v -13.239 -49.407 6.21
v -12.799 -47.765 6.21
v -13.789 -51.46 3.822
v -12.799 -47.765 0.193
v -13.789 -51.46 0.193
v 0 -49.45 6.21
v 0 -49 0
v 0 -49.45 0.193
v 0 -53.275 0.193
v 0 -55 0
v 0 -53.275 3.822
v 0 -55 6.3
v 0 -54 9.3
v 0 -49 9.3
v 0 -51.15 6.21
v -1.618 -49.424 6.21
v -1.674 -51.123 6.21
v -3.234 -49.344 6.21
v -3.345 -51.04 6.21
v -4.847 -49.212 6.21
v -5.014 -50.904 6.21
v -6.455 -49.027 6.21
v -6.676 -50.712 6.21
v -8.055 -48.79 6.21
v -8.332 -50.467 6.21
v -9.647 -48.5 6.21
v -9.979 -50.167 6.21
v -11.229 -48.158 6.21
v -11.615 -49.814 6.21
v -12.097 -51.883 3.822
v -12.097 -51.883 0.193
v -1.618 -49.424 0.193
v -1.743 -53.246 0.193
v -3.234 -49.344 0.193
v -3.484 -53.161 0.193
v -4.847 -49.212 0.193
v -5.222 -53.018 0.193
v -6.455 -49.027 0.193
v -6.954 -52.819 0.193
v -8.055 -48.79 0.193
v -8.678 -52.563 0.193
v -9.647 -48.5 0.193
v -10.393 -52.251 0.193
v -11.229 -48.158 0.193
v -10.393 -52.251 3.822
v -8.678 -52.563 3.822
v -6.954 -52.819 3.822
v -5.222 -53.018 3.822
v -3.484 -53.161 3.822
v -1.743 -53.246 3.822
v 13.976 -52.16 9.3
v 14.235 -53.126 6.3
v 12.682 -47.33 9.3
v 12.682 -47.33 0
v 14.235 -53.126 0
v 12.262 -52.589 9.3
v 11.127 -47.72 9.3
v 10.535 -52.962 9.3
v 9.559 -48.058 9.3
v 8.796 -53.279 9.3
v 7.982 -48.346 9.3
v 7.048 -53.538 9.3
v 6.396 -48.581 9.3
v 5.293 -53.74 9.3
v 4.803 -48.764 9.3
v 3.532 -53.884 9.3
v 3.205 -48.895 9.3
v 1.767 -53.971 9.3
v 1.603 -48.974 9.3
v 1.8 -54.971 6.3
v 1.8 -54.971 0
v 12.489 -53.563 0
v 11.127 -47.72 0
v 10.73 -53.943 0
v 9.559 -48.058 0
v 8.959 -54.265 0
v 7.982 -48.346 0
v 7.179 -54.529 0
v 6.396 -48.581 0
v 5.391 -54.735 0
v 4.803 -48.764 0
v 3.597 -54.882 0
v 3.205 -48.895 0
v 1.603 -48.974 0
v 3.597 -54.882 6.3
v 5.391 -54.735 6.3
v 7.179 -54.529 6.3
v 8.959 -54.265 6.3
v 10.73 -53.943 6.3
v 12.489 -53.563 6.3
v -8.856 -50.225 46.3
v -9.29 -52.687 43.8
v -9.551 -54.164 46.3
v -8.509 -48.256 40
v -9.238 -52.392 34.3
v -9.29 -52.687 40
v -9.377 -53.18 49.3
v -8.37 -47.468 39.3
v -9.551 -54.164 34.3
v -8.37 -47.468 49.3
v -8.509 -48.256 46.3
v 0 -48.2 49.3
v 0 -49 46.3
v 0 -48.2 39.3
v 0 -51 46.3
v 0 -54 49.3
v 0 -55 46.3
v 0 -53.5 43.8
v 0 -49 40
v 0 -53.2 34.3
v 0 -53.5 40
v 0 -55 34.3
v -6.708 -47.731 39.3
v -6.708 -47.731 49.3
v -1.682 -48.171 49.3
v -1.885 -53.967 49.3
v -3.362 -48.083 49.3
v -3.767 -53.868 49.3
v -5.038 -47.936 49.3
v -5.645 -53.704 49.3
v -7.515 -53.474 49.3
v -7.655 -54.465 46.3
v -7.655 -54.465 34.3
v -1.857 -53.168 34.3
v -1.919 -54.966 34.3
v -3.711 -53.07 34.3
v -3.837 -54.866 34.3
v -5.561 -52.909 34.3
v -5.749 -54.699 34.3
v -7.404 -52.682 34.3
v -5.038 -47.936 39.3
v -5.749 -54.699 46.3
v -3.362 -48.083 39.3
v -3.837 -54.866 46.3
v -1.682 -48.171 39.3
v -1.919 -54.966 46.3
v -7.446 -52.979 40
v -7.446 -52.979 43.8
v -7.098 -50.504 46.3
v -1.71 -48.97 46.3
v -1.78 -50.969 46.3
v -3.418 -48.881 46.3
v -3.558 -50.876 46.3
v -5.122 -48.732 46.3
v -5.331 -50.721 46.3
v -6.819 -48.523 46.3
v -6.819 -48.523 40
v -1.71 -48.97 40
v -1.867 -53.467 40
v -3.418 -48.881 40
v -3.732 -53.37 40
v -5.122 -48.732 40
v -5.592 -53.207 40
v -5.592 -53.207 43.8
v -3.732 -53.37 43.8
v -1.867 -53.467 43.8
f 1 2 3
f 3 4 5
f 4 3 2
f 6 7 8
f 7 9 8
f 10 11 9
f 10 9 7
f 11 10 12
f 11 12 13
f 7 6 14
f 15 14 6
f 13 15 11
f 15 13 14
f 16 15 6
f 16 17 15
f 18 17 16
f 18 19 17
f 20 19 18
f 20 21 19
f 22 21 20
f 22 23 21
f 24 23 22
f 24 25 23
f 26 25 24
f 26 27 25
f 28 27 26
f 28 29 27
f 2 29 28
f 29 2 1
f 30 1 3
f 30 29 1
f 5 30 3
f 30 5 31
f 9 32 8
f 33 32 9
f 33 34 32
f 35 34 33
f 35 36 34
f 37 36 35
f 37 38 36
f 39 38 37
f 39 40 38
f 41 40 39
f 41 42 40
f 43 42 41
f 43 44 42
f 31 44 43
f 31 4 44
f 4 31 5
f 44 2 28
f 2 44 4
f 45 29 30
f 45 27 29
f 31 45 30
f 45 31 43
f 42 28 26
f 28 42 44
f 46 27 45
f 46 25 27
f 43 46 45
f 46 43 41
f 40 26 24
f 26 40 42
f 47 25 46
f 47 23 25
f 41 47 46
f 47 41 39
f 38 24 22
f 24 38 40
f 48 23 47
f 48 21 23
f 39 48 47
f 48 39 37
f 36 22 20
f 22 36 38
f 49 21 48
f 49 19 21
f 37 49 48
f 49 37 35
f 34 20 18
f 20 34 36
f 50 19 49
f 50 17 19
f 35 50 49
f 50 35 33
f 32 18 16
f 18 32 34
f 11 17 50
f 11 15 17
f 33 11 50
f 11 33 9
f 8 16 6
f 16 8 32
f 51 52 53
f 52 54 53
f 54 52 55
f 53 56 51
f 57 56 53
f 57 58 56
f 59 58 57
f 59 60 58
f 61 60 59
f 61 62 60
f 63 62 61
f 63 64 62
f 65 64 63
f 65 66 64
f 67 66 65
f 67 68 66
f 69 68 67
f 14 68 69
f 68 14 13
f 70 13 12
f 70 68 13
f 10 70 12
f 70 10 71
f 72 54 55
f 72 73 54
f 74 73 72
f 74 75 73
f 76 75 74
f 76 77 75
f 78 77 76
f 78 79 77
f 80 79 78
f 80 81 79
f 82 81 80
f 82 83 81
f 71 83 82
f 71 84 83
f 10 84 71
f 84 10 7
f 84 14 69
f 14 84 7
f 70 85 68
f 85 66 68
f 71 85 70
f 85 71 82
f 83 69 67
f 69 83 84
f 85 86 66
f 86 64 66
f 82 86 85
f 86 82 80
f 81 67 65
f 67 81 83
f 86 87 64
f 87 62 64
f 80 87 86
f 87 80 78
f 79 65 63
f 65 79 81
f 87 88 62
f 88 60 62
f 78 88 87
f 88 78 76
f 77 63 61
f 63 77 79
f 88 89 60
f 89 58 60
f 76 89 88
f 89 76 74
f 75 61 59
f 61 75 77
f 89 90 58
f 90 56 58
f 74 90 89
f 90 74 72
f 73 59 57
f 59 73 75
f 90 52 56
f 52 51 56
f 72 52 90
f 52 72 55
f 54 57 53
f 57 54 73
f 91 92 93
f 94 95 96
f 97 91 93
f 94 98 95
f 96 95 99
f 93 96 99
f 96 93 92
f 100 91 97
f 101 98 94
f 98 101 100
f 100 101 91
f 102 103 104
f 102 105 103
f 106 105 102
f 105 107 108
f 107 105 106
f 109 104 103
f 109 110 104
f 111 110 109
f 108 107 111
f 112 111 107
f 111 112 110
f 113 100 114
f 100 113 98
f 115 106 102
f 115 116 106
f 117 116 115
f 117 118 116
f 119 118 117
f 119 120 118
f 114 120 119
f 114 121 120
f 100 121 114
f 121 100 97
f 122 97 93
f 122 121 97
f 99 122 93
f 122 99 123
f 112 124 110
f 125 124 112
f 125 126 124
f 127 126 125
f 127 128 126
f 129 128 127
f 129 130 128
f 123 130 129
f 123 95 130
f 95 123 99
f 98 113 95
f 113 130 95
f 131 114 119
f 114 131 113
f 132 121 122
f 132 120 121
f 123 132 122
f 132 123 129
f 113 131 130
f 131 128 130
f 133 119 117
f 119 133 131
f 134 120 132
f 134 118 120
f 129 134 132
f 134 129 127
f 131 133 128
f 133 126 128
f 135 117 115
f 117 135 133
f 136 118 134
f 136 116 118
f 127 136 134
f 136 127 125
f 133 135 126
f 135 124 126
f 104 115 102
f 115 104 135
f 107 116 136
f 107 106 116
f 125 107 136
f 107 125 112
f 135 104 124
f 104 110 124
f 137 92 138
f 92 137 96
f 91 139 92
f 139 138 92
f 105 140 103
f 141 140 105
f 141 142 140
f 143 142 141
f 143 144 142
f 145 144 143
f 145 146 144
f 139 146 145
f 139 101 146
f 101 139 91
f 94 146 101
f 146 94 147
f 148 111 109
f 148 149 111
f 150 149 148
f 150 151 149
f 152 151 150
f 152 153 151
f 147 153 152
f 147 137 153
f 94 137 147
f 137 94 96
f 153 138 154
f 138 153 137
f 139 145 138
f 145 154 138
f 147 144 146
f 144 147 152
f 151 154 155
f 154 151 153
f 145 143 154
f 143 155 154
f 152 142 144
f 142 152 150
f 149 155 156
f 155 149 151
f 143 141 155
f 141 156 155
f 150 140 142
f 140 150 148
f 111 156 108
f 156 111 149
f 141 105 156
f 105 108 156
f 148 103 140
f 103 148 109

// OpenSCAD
// create main enclosure
module shell(diameter, height, wall_thickness, base){
	translate([0, 0, height/2])
		difference() {
			cylinder(h = height, d = diameter, center = true);
				if (base) // remove core, keep bottom
					translate([0,0,wall_thickness])
						cylinder(h = height, d = diameter-wall_thickness*2, center = true);
				else // remove core, no bottom
					cylinder(h = height+1, d = diameter-wall_thickness*2, center = true);
		}
}

// connectors to receive another module on top
// these are placed 10deg off-center -> counterparts should be placed -10deg off center
module connectors_female(angle, base_radius, height, wall_thickness) {
	width = 10; // in degrees
	rotate([0,0,angle-width])
		rotate_extrude(angle = width, $fn = 200)
			translate([-base_radius + wall_thickness, height-5.7]) //0.3 to center scaled male pin
				polygon(
					points = [[0,0],[0,12],[1,15],[6.8,15],[6.8,5],[1.8,0], [1.5,5.7],[1.5,5.7+3.8],[1.5+2.5,5.7+6.3],[1.5+4.5,5.7+6.3],[1.5+4.5,5.7]],
					paths = [[0,1,2,3,4,5], [6,7,8,9,10,11]]
				);
}

// connectors to connect to another module below
module connectors_male(angle, base_radius, wall_thickness) {
	width = 15; // in degrees
	//pin
	rotate([0,0,angle-width])
		rotate_extrude(angle = width, $fn = 200)
			translate([-base_radius + wall_thickness, -5.7 + 0.45])
				translate([0.45,0]) // counteract the non-centered scale (but leave flat on build plate)
					scale([0.85,0.955]) // scale to leave room for easier connection (10%=[0.9,0.9])
						polygon(
							points = [[1.5,5.7],[1.5,9.5],[4,12],[6,12],[6,5.7]],
							paths = [[0,1,2,3,4,5]]
						);

	// pin-base
	rotate([0,0,angle])
		rotate_extrude(angle = width, $fn = 200)
			translate([-base_radius + wall_thickness, -5.7])
				polygon(
					points = [[0,5.7],[0,12],[1,15],[6,15],[6,5.7],[1.8,5.7]],
					paths = [[0,1,2,3,4,5]]
				);
}

// adds a sensor enclosure to the module
// parameters are length/width of enclosure
module enclosure(angle, length, width, base_radius, base_height, wall_thickness, port_radius) {
	difference() {
		difference() {
			translate([base_radius-length-wall_thickness,-width/2,0])
				difference() {
					cube([length, width, base_height], false);
					translate([wall_thickness,wall_thickness,wall_thickness])
						cube([length, width-wall_thickness*2, base_height-wall_thickness+1], false);
				}

			// wiring hole
			translate([base_radius-length-wall_thickness-1, 0, base_height/2+wall_thickness/2])
				rotate([0,90,0])
					cylinder(wall_thickness+2, r = port_radius);
		}

		// make sure we don't exceed the outer shell
		difference() {
			cylinder(h = base_height * 4, d = base_radius * 2.5, center = true);
			cylinder(h = base_height * 4 + 2, d = base_radius * 2, center = true);
		}
	}
};


// example renders
connectors_female(90, 60, 40, 5);
connectors_male(90, 60, 5);
